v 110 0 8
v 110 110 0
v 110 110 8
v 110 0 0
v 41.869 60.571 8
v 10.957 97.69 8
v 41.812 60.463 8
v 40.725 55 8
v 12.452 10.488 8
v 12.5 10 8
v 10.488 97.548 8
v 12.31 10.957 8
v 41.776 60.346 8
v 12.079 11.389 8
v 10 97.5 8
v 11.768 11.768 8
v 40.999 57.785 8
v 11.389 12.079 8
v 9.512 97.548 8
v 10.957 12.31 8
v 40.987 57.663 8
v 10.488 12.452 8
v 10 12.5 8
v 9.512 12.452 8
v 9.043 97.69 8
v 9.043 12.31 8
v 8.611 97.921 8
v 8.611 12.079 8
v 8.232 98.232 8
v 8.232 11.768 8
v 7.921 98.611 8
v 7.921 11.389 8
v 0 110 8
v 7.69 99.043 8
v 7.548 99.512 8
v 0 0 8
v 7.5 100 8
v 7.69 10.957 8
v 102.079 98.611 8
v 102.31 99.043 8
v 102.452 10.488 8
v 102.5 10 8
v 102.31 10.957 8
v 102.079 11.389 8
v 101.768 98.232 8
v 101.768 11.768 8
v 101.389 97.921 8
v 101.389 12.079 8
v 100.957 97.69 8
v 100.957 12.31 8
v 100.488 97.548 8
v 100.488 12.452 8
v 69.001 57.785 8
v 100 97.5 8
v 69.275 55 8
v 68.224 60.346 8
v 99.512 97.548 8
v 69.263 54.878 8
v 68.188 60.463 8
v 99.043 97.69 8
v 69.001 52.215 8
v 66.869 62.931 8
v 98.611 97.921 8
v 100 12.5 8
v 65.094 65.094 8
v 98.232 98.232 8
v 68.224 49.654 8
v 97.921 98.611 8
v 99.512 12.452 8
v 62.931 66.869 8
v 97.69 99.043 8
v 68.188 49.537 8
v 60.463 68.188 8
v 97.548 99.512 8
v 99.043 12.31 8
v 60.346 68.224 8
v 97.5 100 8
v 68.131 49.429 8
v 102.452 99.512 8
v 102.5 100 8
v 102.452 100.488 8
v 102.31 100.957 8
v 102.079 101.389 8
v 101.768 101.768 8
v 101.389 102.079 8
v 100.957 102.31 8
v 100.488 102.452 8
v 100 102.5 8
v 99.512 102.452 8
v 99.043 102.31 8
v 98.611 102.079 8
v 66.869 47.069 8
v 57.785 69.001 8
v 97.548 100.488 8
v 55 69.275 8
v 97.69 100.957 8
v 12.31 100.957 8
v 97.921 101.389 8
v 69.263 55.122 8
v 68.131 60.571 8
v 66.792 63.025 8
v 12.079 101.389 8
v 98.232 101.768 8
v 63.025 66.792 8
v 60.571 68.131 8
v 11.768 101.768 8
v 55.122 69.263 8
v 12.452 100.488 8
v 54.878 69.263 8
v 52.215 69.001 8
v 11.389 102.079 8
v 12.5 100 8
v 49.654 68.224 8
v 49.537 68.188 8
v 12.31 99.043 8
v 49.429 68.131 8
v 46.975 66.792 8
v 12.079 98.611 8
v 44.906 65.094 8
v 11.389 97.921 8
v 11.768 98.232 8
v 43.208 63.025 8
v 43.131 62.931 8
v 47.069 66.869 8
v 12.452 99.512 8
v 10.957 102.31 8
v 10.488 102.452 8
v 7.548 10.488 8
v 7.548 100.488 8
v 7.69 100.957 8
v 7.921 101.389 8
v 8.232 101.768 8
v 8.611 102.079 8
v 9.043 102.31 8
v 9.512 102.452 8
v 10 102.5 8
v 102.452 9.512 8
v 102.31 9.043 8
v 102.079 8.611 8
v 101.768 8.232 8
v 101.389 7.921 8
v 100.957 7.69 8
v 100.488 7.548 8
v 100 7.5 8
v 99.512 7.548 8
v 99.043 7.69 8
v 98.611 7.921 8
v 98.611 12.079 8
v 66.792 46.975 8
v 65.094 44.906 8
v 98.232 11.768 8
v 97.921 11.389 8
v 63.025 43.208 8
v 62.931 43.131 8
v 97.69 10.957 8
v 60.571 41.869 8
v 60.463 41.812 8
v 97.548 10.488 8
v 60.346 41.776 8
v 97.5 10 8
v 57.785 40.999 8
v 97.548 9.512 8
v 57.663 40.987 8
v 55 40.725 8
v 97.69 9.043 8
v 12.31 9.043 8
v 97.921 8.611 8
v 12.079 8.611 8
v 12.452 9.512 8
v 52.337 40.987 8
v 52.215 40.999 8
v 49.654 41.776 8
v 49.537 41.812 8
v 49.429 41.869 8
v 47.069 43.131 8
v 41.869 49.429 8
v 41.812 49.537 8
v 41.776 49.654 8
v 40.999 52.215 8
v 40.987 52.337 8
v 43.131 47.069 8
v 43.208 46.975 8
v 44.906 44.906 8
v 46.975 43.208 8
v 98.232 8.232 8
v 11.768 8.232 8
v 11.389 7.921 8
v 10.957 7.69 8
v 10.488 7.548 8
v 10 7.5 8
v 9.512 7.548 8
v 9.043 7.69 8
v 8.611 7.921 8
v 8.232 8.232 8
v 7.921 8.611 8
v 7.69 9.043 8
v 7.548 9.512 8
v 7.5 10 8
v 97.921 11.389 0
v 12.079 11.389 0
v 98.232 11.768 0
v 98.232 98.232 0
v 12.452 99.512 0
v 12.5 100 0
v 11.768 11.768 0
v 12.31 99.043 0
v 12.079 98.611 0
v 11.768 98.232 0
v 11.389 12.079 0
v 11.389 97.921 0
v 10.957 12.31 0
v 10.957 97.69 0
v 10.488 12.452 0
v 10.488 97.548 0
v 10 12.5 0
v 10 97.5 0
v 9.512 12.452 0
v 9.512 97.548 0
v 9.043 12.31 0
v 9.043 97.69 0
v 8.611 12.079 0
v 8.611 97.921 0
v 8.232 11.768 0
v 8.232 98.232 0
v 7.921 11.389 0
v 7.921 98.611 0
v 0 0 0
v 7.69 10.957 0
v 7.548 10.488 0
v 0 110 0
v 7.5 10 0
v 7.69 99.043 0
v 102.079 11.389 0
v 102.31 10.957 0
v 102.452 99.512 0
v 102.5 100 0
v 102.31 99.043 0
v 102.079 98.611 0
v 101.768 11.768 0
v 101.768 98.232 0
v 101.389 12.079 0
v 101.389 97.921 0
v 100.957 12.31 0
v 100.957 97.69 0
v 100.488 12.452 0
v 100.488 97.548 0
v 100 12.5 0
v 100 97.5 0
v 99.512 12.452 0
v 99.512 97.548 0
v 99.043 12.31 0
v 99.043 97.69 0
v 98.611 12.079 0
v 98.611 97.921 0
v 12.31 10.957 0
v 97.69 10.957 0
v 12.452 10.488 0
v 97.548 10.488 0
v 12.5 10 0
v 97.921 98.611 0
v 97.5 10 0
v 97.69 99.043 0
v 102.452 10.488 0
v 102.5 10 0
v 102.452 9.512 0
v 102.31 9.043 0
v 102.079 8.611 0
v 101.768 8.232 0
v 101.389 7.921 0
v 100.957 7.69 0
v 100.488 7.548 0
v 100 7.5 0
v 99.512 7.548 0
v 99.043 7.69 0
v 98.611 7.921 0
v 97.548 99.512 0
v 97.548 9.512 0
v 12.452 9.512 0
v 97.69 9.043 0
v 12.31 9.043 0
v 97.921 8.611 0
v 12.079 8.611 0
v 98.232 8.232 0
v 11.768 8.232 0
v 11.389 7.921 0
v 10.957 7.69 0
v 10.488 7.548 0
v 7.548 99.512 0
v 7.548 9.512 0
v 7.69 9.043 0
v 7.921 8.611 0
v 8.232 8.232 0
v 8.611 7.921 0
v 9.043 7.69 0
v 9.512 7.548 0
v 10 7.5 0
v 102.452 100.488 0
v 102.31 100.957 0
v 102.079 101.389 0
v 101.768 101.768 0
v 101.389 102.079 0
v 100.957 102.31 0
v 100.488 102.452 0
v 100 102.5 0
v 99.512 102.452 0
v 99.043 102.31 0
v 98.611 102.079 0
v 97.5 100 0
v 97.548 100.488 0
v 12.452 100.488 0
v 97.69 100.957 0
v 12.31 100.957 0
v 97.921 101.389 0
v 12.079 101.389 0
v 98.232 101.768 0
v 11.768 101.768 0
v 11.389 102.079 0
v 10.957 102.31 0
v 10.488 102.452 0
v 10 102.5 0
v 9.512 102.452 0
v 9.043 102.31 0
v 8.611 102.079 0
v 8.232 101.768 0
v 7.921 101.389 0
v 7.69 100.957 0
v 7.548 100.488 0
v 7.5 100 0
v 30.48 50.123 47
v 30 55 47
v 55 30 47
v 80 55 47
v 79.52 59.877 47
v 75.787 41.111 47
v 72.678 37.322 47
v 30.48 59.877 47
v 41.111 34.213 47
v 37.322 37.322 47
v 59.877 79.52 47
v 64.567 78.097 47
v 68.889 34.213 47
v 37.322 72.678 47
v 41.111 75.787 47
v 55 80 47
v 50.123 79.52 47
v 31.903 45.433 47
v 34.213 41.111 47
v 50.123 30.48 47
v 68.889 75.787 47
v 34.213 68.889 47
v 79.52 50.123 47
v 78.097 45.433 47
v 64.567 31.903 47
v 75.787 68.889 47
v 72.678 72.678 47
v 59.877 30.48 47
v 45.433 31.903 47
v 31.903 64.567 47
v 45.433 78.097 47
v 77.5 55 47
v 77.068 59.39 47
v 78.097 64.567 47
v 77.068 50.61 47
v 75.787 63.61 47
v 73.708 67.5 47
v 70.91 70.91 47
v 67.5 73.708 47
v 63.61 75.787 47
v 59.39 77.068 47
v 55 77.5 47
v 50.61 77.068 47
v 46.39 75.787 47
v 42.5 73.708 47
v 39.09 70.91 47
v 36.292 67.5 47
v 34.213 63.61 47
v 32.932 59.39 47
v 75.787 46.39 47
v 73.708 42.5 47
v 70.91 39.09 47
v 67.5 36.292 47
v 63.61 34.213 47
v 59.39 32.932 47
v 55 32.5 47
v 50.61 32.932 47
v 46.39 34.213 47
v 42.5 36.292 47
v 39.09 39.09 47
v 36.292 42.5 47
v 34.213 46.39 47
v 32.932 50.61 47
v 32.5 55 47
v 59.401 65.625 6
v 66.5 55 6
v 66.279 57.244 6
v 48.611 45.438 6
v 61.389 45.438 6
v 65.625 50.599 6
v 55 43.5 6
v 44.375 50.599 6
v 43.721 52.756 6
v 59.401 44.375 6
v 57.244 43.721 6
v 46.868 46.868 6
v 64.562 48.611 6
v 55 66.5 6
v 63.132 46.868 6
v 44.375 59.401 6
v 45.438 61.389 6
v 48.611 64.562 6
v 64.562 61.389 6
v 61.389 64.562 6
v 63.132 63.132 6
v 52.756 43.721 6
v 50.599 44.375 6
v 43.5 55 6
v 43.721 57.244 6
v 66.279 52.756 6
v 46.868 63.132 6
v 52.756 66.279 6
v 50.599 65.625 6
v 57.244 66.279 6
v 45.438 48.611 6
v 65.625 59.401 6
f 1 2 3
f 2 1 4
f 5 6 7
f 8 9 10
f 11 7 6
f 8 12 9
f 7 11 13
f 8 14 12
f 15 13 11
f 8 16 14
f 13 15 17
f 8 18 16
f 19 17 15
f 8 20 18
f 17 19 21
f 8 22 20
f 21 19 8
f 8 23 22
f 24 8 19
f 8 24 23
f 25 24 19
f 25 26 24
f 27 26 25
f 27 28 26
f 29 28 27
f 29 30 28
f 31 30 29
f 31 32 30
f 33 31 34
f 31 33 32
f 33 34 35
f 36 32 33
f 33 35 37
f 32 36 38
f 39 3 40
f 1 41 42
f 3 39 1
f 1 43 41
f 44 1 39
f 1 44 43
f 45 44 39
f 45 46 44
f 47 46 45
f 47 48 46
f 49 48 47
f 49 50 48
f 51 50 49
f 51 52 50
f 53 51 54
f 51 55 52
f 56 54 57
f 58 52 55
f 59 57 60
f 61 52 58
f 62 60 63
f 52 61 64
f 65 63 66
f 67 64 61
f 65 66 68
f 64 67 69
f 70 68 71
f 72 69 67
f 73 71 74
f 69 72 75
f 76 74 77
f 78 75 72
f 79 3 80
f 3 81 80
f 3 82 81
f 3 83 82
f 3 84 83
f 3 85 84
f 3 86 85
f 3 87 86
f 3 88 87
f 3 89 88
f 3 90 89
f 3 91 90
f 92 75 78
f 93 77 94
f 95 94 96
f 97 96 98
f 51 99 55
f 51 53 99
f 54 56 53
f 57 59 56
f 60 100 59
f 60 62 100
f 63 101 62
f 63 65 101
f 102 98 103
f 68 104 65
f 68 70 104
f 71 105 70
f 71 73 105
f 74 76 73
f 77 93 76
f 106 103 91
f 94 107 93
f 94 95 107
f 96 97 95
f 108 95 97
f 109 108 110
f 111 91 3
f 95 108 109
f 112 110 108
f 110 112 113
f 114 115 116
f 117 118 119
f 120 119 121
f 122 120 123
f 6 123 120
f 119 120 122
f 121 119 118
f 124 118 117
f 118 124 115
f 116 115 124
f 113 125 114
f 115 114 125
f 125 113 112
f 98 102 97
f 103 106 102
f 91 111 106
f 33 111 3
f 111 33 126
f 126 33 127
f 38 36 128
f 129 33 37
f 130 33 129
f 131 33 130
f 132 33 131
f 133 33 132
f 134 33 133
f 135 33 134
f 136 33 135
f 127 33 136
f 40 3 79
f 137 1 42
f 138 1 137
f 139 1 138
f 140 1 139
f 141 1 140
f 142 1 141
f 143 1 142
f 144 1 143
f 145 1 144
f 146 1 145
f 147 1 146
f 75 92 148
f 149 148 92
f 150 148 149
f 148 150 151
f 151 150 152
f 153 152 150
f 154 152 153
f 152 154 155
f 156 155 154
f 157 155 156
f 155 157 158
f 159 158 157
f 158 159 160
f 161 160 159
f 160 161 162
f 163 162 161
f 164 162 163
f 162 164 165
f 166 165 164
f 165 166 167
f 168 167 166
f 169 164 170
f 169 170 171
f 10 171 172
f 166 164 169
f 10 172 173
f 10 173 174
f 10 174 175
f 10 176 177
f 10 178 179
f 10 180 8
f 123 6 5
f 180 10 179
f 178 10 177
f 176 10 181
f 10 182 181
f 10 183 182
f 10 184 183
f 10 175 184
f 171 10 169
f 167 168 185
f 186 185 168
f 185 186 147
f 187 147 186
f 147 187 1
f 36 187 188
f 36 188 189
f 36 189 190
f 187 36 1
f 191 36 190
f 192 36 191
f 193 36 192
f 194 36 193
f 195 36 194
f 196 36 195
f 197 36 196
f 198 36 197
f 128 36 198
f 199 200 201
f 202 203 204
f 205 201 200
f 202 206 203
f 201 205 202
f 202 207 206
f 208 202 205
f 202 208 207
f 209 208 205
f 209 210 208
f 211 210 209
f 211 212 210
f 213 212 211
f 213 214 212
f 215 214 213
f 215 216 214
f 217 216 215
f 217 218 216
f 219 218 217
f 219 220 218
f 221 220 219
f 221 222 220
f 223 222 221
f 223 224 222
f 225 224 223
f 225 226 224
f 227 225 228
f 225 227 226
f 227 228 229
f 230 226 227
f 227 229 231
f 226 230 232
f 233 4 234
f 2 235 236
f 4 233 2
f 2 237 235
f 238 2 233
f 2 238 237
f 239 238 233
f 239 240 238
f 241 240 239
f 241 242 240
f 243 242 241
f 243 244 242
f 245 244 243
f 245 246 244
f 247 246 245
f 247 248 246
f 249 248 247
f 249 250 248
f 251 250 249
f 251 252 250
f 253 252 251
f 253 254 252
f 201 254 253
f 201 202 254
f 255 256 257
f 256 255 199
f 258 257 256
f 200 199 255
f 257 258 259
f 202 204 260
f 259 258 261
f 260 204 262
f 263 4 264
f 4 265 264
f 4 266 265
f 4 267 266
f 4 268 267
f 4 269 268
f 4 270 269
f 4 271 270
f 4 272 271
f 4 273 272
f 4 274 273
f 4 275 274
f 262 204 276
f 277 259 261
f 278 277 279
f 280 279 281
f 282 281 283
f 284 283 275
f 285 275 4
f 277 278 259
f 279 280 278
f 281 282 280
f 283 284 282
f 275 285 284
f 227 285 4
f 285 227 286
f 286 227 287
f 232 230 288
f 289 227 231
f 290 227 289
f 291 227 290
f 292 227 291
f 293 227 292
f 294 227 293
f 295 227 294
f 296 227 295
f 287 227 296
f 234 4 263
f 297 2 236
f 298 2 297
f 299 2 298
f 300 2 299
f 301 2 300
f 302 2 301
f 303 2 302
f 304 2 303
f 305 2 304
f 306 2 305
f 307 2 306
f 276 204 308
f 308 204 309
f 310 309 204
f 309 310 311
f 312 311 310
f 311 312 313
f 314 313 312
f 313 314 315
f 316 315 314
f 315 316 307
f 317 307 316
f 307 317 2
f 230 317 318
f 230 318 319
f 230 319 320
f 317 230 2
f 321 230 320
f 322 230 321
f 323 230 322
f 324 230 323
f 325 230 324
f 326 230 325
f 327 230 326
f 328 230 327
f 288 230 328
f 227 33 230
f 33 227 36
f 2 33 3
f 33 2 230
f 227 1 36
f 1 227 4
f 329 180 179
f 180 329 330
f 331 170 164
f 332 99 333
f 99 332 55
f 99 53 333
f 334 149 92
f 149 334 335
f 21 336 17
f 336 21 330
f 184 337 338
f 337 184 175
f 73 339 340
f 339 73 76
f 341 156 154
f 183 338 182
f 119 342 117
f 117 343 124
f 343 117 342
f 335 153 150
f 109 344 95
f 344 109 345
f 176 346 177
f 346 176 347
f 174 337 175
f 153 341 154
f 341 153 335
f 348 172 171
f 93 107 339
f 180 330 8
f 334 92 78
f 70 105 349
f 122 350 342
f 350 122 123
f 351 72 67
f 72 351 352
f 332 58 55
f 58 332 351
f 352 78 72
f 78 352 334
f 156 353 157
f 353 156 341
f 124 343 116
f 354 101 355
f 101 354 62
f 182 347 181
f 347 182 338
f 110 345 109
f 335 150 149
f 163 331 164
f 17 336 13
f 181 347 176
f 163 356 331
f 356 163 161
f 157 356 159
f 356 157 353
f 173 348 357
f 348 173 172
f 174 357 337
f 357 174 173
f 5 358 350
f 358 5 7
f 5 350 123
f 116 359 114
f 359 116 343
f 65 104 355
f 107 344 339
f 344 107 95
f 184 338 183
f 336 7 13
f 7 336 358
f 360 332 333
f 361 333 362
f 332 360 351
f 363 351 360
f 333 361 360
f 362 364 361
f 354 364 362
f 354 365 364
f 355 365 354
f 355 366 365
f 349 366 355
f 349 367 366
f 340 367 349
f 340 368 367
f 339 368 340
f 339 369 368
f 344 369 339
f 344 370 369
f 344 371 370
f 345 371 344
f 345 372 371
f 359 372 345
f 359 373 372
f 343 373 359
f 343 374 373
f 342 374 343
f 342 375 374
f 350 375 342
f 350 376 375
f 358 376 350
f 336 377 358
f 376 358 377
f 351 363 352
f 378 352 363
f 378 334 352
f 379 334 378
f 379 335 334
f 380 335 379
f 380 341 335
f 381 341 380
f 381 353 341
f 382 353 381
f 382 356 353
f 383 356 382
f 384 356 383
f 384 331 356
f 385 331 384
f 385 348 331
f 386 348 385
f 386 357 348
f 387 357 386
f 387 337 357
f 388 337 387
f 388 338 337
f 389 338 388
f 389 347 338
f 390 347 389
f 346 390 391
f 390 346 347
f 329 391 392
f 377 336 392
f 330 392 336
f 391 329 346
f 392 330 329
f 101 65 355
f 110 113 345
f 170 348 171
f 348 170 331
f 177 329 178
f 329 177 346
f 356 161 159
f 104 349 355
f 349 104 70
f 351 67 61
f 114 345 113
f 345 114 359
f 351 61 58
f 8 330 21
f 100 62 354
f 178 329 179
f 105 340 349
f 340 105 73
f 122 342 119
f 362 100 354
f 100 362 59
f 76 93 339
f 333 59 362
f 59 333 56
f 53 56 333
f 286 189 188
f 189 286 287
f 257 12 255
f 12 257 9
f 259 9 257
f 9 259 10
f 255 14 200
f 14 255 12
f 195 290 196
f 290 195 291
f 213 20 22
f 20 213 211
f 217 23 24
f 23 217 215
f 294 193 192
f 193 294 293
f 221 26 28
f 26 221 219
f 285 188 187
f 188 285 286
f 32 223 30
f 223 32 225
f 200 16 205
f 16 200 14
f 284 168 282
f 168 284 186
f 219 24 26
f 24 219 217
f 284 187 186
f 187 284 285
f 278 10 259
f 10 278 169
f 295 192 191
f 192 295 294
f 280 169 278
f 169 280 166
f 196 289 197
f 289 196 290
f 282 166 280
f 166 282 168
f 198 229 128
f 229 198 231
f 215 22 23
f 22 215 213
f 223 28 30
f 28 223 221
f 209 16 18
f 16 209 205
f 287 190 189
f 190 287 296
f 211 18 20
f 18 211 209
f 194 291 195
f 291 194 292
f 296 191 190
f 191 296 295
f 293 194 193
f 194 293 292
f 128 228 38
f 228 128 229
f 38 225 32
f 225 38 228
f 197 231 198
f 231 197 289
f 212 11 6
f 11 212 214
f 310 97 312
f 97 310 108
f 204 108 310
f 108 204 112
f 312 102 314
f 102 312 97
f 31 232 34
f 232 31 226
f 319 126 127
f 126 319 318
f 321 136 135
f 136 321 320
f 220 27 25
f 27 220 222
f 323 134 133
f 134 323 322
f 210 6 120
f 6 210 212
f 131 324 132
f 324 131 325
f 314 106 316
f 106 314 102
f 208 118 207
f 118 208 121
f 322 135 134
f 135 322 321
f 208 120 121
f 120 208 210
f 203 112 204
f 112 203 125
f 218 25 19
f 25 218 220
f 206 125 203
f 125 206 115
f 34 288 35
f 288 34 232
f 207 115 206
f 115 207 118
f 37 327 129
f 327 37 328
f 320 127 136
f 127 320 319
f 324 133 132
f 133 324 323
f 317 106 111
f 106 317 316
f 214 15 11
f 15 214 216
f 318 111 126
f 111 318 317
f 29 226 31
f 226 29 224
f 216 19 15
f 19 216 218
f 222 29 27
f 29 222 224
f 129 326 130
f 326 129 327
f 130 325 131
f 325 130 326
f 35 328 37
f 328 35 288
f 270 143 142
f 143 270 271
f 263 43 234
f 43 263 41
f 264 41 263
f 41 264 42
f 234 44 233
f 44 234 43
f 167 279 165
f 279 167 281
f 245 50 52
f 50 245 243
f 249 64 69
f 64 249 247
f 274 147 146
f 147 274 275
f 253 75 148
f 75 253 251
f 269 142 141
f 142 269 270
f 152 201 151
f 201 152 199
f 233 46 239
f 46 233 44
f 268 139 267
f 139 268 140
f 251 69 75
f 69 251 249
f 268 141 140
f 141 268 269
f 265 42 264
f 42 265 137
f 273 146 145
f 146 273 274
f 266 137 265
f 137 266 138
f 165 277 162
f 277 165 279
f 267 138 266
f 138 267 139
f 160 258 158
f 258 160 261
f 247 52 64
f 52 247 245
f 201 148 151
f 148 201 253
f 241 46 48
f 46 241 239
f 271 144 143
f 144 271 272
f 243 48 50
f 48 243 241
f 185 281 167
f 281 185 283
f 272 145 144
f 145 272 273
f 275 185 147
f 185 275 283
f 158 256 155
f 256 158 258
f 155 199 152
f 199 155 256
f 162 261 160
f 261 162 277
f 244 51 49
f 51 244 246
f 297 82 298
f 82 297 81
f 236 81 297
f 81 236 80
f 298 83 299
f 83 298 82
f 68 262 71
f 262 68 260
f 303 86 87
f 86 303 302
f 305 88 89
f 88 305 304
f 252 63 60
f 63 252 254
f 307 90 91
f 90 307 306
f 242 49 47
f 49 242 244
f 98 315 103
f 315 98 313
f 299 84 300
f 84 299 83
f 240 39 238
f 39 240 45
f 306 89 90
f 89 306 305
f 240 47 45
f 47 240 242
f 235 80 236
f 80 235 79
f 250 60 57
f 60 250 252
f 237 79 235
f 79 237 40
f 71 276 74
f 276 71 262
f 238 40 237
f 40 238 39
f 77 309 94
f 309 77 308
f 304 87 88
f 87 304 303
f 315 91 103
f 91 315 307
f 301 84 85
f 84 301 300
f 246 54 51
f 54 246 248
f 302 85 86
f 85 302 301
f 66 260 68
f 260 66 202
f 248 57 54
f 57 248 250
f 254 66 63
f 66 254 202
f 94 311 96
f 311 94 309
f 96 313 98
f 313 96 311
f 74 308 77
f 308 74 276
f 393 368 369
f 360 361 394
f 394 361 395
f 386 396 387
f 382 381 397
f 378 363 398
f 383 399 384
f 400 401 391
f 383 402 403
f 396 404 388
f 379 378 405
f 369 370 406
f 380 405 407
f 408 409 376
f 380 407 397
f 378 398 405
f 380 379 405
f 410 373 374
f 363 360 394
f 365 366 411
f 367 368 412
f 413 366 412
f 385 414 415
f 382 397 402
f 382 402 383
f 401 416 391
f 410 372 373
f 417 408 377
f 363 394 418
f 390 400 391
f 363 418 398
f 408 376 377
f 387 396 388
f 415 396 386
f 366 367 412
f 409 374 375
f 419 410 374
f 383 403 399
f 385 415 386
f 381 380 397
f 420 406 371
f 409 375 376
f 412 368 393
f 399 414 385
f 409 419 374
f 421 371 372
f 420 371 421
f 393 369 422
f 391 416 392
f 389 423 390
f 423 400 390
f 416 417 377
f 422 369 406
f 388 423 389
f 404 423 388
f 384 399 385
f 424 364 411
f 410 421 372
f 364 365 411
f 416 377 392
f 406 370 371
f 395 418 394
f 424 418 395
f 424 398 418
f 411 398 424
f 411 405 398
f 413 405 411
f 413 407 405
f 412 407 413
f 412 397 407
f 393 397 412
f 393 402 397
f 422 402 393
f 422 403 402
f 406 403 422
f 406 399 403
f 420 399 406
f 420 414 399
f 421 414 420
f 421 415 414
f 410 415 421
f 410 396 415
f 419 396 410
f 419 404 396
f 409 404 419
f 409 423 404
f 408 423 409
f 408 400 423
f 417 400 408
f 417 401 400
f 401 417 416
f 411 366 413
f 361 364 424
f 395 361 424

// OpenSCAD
$fn = 32;

// ----------------------------------------------------------------------
// Hopper: flanged with square flange
// ----------------------------------------------------------------------

// --- parameters (mm) ---
fl = 110;                 // flange side, X and Y
fl_t = 8;                 // flange thickness
cone_h = 40;              // cone height above the flange
top_d = 50;               // cone mouth diameter
bot_d = 28;               // cone spout diameter
wall = 2.5;               // cone wall thickness
hole_r = 2.5;             // flange hole radius
hole_in = 10;             // hole inset from the corners

bore_d = bot_d - 2 * wall;  // spout bore diameter
total_h = fl_t + cone_h - 1;  // overall height

difference() {
  union() {
    cube([fl, fl, fl_t]);
    translate([fl / 2, fl / 2, fl_t - 1])
      cylinder(h = cone_h, d1 = bot_d, d2 = top_d);
  }
  translate([fl / 2, fl / 2, fl_t - 2])
    cylinder(h = cone_h + 1, d1 = bore_d, d2 = top_d - 2 * wall);
  for (sx = [0, 1], sy = [0, 1])
    translate([sx ? fl - hole_in : hole_in,
               sy ? fl - hole_in : hole_in, -1])
      cylinder(r = hole_r, h = fl_t + 2);
}
